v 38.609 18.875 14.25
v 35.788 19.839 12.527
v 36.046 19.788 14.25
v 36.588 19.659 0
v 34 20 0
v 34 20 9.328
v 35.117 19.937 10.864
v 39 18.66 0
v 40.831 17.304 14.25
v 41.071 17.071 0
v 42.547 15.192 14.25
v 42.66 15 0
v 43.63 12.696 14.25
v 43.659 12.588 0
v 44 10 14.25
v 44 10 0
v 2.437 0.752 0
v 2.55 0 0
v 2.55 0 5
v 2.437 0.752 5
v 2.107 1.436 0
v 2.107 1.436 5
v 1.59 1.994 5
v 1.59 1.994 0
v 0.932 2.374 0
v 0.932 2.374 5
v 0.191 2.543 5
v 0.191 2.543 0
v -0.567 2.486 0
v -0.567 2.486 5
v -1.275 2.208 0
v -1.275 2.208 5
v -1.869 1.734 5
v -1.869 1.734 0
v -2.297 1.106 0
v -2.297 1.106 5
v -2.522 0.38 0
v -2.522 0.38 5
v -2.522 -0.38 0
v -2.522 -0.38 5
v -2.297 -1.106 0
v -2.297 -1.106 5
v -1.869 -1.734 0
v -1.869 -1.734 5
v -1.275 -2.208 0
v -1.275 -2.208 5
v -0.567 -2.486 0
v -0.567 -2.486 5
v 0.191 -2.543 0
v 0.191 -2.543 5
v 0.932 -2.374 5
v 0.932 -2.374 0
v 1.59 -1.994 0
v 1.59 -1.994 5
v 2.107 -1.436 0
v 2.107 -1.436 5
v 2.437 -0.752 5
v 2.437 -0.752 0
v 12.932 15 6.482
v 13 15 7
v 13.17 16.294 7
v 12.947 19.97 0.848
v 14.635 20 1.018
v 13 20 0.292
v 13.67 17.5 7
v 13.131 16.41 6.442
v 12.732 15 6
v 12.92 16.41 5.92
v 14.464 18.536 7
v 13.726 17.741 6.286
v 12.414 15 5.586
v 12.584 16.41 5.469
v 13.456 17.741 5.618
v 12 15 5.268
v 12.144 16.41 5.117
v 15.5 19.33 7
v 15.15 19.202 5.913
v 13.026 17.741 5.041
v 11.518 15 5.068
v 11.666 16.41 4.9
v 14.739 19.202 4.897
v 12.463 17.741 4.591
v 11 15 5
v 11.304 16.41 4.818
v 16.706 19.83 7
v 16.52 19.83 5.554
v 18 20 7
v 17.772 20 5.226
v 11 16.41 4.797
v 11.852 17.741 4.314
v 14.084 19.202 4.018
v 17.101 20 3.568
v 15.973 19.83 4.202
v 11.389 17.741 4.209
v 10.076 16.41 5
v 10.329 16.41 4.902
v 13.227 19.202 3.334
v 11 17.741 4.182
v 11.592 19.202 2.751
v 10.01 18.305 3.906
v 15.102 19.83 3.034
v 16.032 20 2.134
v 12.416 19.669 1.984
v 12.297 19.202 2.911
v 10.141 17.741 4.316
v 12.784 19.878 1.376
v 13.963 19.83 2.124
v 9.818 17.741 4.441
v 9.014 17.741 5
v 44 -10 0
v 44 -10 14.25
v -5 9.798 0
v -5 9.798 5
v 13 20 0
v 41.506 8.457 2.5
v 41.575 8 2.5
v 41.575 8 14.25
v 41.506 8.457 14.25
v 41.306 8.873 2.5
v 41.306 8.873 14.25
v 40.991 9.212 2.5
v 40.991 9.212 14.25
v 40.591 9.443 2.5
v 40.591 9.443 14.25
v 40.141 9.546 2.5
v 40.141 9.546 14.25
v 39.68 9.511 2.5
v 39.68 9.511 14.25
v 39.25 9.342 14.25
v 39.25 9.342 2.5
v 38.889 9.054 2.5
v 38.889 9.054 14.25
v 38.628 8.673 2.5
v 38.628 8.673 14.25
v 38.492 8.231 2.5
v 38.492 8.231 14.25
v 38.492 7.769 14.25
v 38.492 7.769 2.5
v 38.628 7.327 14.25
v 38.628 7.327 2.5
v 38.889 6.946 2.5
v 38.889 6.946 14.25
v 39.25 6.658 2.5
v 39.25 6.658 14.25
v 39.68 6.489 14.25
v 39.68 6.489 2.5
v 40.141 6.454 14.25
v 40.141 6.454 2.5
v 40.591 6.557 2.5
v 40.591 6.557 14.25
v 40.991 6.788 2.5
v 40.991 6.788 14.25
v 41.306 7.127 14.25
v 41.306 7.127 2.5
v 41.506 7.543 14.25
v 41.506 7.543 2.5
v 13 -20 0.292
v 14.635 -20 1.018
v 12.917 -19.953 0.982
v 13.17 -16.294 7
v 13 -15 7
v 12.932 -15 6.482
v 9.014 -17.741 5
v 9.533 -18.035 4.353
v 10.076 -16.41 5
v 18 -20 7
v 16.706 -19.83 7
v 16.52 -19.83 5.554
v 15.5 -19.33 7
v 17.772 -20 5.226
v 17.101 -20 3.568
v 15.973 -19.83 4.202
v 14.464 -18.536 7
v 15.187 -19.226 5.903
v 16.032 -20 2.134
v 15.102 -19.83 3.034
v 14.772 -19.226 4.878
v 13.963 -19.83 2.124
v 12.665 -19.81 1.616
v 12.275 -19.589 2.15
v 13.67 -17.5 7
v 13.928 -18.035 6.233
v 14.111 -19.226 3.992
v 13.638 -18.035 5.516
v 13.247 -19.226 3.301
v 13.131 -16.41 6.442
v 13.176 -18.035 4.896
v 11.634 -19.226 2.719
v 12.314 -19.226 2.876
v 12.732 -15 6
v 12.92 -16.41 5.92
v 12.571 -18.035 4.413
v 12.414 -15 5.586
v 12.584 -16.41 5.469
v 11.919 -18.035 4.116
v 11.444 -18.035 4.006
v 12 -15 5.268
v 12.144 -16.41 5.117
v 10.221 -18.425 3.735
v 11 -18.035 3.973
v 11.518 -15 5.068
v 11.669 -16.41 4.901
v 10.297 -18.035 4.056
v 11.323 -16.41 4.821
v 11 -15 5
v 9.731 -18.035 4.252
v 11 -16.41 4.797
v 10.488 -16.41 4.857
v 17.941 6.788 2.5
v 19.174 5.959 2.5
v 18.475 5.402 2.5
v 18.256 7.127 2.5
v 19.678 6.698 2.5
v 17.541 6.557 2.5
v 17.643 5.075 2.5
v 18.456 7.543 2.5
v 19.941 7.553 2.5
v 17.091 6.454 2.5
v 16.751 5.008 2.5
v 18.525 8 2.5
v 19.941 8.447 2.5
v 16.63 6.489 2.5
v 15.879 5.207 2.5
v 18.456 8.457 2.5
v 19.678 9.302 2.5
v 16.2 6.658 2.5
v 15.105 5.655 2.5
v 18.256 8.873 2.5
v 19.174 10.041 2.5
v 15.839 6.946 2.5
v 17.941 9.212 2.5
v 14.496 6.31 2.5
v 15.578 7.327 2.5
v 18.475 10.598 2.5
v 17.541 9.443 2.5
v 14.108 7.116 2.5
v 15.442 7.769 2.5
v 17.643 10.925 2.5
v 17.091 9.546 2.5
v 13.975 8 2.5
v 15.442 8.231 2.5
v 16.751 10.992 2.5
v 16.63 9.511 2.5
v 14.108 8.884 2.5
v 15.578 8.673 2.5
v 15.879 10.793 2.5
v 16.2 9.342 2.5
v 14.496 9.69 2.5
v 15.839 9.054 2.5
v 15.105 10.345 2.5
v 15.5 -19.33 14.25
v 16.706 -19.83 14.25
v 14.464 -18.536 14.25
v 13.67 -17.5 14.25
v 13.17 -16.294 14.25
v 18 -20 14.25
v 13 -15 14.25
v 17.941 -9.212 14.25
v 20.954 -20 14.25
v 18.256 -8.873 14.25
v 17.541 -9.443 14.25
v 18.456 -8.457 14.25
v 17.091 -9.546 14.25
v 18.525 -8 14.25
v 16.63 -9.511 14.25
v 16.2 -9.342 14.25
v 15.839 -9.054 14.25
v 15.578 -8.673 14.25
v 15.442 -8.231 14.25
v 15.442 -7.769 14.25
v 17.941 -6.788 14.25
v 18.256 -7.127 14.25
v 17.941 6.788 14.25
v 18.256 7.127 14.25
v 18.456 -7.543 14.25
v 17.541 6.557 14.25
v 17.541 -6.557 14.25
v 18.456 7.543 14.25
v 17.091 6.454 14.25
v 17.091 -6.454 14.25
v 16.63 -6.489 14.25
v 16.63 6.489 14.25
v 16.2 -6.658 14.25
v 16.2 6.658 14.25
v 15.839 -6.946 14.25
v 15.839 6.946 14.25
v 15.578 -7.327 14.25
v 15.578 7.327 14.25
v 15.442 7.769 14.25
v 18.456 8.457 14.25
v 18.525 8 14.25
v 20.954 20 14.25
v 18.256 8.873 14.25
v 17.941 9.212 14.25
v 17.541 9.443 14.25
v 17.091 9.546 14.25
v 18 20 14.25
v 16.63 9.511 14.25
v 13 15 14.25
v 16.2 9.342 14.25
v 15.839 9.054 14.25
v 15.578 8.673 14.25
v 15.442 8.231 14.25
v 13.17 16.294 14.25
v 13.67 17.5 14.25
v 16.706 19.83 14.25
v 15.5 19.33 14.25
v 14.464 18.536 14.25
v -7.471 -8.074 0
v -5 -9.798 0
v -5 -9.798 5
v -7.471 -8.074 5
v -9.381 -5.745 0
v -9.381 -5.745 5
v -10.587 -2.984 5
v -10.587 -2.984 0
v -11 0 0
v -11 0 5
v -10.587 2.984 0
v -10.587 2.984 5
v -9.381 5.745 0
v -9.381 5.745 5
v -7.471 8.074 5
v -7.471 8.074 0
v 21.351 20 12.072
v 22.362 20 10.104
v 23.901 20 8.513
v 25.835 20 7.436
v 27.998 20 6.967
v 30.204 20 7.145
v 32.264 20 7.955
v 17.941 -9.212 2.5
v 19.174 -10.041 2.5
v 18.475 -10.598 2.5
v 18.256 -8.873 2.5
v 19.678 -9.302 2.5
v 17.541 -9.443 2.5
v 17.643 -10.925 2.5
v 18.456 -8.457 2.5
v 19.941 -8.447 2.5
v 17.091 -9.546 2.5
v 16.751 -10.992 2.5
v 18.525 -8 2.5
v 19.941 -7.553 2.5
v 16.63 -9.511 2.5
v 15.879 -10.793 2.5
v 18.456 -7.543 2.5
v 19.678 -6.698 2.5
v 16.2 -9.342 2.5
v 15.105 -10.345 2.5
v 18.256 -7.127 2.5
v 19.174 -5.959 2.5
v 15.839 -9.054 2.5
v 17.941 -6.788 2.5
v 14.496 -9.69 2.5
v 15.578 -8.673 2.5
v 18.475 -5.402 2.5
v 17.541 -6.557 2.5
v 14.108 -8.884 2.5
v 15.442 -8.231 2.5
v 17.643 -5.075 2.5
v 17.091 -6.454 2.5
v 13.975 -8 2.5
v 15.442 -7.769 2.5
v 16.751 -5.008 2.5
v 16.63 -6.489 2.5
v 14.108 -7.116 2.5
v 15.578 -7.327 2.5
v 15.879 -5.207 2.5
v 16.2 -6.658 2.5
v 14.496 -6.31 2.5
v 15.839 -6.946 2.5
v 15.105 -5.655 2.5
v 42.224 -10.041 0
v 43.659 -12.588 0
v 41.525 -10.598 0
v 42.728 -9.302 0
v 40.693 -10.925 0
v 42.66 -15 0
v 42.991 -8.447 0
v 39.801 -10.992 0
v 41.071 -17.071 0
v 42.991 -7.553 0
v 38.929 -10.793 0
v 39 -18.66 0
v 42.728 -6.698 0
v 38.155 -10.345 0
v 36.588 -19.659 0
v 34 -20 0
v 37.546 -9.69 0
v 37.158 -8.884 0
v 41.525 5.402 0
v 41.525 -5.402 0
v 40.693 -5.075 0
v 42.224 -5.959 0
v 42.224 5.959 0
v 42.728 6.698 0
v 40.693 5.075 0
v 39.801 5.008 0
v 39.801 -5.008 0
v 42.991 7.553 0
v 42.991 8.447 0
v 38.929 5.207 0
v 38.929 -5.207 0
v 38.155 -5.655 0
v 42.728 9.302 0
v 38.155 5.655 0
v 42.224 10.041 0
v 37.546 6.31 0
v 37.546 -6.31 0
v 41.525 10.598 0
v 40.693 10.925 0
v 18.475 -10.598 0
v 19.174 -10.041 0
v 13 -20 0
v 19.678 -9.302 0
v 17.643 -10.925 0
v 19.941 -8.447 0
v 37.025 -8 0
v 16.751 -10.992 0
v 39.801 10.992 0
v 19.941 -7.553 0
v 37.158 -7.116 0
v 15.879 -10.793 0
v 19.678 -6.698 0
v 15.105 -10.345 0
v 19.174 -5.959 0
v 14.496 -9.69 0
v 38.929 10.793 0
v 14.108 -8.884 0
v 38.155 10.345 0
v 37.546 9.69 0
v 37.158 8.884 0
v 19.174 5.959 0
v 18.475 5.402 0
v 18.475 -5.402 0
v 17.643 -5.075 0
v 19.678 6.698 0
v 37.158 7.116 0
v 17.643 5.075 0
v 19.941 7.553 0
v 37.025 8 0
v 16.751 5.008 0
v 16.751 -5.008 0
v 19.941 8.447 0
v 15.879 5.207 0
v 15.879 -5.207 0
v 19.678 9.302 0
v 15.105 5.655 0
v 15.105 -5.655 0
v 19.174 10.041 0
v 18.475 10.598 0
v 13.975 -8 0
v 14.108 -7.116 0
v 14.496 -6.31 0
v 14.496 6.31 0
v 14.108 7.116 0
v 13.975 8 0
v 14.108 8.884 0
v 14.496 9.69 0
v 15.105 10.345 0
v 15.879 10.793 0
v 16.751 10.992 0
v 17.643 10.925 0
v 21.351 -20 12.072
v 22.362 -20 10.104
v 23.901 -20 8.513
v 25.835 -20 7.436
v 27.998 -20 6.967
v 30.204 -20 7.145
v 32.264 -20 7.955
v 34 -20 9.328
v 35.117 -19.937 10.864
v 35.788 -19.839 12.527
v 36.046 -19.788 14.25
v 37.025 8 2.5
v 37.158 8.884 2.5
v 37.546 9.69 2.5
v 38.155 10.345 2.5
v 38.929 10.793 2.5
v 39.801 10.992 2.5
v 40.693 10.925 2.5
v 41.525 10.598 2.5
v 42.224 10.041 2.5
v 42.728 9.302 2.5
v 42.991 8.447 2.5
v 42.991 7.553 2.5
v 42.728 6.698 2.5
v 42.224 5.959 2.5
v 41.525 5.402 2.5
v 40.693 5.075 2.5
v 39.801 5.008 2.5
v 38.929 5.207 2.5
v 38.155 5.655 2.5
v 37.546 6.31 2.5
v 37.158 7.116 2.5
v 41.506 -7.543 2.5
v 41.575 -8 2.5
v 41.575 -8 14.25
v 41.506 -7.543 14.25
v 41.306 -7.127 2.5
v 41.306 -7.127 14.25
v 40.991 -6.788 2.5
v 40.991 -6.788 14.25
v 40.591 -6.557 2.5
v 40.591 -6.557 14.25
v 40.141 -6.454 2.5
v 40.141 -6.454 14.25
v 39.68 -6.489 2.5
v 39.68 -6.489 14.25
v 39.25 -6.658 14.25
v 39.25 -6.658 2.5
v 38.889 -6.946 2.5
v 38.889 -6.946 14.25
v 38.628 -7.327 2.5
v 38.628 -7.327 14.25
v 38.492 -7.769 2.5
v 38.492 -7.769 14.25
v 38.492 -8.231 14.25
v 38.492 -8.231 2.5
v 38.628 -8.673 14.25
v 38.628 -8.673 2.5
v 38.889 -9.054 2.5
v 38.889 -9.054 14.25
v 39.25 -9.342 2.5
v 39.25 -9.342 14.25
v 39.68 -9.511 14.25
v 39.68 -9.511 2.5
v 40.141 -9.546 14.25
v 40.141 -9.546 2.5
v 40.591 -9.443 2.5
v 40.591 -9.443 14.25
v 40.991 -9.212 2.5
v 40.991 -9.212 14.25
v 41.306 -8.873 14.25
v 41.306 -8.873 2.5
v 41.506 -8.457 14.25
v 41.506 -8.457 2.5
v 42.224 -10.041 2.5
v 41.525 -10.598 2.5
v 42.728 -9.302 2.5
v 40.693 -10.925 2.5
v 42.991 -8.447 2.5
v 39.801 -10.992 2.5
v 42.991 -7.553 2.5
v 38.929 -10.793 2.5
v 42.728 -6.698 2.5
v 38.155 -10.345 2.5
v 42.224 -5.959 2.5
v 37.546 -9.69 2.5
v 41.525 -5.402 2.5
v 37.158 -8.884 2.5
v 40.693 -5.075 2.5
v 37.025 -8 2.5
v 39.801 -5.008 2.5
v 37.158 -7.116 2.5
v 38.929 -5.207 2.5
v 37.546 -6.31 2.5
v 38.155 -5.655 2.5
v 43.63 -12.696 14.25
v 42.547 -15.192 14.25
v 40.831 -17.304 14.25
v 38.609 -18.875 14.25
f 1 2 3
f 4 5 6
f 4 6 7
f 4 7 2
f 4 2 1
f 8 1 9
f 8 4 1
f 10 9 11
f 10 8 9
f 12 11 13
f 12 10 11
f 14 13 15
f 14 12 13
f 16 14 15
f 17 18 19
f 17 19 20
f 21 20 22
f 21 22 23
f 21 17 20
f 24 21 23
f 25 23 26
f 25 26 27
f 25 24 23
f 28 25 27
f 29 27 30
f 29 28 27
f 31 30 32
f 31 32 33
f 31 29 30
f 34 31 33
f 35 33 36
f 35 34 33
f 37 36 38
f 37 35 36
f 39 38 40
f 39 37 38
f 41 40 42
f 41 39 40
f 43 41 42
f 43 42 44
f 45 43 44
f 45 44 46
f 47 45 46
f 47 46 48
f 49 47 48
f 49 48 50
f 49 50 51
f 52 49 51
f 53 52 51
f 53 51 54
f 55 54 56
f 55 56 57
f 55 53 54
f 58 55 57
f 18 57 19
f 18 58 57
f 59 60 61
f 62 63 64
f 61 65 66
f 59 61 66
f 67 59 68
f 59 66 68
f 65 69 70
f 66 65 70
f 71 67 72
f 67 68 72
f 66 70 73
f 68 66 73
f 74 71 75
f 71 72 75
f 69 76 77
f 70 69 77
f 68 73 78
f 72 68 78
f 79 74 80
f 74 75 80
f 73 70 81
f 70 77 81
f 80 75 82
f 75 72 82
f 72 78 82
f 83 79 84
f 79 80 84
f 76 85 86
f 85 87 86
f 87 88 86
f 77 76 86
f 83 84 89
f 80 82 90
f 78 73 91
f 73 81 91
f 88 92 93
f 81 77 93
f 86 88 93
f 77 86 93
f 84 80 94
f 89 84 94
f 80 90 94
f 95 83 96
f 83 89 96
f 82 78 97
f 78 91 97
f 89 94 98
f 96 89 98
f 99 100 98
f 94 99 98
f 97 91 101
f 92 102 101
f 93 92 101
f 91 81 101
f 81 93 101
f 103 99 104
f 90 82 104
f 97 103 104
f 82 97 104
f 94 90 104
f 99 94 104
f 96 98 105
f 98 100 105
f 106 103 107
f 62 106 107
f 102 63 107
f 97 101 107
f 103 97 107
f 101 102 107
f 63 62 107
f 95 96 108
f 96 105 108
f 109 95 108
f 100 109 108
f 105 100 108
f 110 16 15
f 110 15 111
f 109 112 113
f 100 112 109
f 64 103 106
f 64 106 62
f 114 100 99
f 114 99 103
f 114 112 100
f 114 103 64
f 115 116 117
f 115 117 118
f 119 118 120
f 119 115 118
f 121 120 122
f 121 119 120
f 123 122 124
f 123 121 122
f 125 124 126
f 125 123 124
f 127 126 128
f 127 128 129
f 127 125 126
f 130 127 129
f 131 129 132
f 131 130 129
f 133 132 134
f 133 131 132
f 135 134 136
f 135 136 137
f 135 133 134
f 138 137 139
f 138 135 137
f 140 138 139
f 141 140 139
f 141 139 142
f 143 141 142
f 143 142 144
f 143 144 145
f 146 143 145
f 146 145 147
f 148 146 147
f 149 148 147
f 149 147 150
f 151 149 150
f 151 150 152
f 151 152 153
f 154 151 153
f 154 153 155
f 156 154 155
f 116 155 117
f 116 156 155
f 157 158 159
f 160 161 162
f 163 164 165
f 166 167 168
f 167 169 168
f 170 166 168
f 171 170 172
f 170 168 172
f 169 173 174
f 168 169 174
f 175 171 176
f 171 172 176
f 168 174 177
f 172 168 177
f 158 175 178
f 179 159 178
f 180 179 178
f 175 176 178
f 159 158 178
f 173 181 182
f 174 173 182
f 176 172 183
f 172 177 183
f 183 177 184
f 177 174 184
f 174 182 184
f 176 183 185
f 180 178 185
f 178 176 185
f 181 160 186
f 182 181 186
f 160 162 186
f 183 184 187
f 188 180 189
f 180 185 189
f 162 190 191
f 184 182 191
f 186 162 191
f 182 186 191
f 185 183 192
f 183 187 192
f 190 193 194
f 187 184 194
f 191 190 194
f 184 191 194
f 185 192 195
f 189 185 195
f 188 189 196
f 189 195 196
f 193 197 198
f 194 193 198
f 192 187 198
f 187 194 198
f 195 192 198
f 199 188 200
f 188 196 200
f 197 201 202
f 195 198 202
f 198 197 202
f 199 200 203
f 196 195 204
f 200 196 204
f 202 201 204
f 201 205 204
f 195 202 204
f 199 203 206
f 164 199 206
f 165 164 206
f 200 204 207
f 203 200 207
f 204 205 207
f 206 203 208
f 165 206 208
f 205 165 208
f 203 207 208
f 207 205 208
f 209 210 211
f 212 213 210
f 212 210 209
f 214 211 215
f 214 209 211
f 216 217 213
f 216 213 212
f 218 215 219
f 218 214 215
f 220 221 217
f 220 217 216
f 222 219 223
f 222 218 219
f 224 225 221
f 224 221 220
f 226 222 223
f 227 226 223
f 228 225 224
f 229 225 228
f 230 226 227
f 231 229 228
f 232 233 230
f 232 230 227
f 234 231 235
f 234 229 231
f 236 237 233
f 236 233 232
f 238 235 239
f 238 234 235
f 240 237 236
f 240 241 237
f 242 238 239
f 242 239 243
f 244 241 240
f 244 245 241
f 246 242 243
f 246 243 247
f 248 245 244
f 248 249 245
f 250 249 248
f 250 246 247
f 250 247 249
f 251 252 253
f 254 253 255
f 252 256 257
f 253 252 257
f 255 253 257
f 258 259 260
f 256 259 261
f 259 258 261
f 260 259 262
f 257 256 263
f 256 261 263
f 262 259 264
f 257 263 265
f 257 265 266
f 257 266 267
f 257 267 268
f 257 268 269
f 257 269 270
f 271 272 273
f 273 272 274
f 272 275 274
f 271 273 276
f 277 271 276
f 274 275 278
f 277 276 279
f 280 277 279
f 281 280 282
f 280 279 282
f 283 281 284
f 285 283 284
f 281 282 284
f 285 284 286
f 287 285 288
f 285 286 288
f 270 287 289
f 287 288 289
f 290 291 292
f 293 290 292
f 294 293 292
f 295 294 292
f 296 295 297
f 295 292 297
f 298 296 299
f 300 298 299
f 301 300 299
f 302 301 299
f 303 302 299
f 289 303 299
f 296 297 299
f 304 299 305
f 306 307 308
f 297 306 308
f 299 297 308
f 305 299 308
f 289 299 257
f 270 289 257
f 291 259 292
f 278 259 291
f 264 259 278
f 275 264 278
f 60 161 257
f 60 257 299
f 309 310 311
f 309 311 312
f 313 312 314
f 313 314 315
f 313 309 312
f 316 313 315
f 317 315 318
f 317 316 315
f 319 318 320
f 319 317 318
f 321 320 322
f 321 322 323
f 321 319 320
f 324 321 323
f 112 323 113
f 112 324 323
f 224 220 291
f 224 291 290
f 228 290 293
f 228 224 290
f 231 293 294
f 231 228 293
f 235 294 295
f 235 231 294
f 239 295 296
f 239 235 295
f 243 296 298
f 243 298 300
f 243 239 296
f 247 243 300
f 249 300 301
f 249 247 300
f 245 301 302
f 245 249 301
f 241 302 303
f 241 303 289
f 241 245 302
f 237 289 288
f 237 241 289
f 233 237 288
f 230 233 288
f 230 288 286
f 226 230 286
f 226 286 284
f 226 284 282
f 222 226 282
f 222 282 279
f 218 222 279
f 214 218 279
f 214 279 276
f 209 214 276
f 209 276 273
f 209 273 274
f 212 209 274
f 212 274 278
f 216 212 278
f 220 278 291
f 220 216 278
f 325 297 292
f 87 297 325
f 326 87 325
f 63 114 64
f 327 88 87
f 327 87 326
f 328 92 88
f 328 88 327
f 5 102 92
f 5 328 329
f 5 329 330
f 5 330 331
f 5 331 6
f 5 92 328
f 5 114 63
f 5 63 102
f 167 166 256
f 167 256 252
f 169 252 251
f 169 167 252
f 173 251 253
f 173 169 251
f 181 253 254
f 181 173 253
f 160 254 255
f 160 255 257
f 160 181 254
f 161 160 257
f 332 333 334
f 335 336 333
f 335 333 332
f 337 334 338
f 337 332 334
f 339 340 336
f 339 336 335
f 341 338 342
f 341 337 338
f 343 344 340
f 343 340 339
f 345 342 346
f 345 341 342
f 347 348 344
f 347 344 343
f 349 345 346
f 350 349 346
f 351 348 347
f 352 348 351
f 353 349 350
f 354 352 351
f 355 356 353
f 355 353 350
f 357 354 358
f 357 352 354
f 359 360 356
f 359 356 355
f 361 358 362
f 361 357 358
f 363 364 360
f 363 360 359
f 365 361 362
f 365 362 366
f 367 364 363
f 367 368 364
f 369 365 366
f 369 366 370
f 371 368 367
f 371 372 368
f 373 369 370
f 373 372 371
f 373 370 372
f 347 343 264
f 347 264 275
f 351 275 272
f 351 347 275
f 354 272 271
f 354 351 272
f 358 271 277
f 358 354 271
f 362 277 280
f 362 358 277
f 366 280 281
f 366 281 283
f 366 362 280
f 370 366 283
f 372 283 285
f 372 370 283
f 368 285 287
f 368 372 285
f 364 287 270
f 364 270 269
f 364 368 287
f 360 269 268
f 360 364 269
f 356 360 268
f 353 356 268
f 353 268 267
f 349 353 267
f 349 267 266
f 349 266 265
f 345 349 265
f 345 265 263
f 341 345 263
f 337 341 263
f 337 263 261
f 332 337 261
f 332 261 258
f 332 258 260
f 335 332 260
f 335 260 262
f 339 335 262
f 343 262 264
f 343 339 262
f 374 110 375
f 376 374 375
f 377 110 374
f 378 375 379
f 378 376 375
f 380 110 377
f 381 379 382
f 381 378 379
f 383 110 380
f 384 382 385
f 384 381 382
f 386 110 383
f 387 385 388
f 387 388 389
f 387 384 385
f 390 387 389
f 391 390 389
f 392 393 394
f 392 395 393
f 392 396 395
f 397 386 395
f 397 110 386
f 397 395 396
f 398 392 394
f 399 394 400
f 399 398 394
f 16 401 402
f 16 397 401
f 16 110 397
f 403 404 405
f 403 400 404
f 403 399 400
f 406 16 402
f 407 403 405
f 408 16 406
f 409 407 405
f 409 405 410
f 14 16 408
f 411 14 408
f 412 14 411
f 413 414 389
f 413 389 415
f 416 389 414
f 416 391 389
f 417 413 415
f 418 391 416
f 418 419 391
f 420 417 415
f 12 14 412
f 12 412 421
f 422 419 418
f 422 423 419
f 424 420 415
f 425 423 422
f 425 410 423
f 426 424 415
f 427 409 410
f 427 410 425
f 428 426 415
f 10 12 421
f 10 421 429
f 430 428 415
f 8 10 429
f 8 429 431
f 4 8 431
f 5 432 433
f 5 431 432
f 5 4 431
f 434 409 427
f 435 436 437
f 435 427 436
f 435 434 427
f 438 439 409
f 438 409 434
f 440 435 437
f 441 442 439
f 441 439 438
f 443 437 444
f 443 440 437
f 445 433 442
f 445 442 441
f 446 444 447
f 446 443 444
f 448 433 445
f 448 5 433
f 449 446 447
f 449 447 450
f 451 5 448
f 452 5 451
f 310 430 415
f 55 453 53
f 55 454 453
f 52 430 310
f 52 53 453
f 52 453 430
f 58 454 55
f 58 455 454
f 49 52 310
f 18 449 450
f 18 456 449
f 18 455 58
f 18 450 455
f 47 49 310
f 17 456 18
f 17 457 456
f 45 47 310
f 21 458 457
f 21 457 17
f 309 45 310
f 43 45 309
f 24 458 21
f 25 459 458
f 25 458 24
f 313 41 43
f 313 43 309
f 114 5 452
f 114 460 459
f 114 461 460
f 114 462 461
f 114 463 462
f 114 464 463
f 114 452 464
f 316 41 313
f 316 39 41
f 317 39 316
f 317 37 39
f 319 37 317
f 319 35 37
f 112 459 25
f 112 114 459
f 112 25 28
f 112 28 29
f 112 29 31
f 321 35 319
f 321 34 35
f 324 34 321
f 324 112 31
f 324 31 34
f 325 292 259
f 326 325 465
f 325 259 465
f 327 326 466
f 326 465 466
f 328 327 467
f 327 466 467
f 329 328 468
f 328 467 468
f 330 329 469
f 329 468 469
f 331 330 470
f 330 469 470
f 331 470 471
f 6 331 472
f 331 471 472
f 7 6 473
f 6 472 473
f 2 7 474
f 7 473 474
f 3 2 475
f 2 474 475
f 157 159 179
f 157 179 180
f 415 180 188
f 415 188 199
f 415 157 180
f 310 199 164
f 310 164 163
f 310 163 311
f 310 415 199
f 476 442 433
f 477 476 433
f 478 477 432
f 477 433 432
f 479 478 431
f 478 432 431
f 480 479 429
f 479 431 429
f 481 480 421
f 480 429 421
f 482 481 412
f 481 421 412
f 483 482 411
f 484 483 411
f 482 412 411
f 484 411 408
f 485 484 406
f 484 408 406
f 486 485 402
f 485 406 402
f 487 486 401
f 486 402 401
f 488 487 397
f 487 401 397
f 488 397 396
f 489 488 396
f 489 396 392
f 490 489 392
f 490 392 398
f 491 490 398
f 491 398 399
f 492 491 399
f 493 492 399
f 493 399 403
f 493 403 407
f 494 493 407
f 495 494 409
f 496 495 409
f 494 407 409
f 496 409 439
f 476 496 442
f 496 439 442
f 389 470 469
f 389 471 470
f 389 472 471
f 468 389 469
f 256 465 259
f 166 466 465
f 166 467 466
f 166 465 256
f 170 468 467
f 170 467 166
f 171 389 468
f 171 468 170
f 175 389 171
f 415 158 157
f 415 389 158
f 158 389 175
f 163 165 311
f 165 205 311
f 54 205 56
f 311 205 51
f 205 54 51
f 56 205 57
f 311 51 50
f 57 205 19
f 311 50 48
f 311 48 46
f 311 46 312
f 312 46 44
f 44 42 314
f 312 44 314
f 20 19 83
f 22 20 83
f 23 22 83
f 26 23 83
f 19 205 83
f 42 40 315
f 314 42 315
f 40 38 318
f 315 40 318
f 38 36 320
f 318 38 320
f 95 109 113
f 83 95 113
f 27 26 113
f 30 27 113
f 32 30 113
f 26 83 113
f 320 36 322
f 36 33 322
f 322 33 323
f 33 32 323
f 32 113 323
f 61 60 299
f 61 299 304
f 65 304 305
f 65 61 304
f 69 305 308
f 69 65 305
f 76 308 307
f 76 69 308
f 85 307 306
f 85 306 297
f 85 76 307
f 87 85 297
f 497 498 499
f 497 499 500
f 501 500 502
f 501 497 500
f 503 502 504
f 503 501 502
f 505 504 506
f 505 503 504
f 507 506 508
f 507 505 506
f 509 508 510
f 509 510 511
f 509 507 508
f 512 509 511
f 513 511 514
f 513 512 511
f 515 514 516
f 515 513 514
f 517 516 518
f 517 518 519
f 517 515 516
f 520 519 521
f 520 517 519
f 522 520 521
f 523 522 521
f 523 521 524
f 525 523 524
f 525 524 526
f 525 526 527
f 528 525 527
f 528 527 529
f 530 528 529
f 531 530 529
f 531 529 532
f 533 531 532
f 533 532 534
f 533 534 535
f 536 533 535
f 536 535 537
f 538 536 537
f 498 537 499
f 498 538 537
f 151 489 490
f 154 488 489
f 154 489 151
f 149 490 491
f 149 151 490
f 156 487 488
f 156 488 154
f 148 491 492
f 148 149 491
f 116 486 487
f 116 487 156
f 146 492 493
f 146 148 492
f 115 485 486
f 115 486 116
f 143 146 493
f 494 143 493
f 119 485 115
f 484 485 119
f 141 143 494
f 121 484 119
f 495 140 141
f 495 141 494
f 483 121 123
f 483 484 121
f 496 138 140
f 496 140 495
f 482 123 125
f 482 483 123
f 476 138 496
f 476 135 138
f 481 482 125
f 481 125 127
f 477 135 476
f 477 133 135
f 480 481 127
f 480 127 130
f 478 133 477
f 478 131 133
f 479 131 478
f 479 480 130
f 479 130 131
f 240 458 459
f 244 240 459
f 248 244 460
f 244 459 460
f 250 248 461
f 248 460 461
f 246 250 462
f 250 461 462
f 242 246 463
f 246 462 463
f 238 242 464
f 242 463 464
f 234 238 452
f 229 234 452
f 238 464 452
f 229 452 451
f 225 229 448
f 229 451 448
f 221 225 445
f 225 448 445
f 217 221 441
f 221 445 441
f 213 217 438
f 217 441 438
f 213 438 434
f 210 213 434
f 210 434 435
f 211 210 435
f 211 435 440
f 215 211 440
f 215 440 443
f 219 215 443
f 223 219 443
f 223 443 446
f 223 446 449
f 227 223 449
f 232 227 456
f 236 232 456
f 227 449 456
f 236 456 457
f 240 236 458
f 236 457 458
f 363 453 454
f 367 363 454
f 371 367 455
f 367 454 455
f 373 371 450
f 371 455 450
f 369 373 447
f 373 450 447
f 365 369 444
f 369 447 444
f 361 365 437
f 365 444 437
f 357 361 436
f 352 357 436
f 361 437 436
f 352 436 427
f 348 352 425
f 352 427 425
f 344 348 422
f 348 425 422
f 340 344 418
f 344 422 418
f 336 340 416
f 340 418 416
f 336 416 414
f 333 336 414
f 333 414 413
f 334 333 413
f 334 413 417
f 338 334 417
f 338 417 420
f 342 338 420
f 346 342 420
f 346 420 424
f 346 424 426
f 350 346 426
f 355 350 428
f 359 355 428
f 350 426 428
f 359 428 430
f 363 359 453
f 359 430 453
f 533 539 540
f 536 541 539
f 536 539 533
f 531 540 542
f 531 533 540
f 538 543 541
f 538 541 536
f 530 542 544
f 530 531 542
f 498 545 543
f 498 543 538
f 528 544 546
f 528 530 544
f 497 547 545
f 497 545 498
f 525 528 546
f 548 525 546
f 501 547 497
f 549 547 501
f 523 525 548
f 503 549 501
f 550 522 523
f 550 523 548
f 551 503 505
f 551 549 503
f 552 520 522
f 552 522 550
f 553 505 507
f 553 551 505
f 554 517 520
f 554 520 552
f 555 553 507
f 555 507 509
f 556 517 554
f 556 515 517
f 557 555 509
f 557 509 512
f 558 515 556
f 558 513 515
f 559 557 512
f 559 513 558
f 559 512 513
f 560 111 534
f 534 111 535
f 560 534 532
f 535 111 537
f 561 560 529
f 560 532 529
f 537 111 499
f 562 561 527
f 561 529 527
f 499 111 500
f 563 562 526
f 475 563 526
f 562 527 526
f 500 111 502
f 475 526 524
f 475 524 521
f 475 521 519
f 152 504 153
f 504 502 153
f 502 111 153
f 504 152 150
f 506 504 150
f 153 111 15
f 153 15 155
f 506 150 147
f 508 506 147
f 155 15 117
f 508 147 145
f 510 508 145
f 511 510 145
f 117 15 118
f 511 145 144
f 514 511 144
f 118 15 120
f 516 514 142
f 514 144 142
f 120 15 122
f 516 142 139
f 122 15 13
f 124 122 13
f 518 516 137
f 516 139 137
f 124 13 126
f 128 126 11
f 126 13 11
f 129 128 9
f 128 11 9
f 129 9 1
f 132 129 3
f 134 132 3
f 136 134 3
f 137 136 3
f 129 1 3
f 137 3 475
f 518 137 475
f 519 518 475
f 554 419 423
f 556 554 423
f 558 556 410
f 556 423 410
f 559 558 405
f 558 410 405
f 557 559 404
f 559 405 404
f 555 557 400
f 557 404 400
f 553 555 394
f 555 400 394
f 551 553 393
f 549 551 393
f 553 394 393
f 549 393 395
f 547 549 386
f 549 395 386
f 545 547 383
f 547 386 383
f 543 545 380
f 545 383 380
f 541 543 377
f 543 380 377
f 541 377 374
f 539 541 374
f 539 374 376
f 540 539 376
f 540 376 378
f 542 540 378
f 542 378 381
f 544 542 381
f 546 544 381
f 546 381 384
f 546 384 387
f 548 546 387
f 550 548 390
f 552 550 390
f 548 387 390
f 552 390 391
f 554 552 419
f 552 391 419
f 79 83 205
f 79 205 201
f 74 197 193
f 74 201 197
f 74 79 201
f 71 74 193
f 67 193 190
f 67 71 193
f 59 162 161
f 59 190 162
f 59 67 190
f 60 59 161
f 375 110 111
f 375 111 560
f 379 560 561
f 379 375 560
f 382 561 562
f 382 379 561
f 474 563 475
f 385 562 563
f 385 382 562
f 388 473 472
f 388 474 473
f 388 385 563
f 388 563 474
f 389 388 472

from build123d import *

# Parameters (mm, degrees)
SKETCH_3_R          = 2.55
SKETCH_3_R_2        = 1.55
EXTRUDE_1_DEPTH     = 5
SKETCH_4_R          = 1.55
EXTRUDE_2_DEPTH     = 9.25
FILLET_1_R          = 2
FILLET_START        = 6.9999999
FILLET_2_2_DEPTH    = 8.0000001
SKETCH_5_R          = 3
CUT_EXTRUDE_1_DEPTH = 2.5
SKETCH_6_R          = 7.55
CUT_EXTRUDE_2_DEPTH = 62.147874109


with BuildPart() as part:
    # 草图3 → 凸台-拉伸1 (new body)
    with BuildSketch(Plane.XY):
        with BuildLine():
            Line((13, 20), (34, 20))
            ThreePointArc((34, 20), (41.071067812, 17.071067812), (44, 10))
            Line((44, 10), (44, -10))
            ThreePointArc((44, -10), (41.071067812, -17.071067812), (34, -20))
            Line((34, -20), (13, -20))
            Line((13, -20), (-5, -9.797958971))
            ThreePointArc((-5, -9.797958971), (-11, 0), (-5, 9.797958971))
            Line((-5, 9.797958971), (13, 20))
        make_face()
        Circle(SKETCH_3_R, mode=Mode.SUBTRACT)
        with Locations((40.025, 8)):
            Circle(SKETCH_3_R_2, mode=Mode.SUBTRACT)
        with Locations((40.025, -8)):
            Circle(SKETCH_3_R_2, mode=Mode.SUBTRACT)
        with Locations((16.975, -8)):
            Circle(SKETCH_3_R_2, mode=Mode.SUBTRACT)
        with Locations((16.975, 8)):
            Circle(SKETCH_3_R_2, mode=Mode.SUBTRACT)
    extrude(amount=EXTRUDE_1_DEPTH)

    # 草图4 → 凸台-拉伸2 (add)
    with BuildSketch(Plane.XY.offset(5)):
        with BuildLine():
            Line((13, 20), (34, 20))
            ThreePointArc((34, 20), (41.071067812, 17.071067812), (44, 10))
            Line((44, 10), (44, -10))
            ThreePointArc((44, -10), (41.071067812, -17.071067812), (34, -20))
            Line((34, -20), (13, -20))
            Line((13, -20), (13, 20))
        make_face()
        with Locations((16.975, -8)):
            Circle(SKETCH_4_R, mode=Mode.SUBTRACT)
        with Locations((16.975, 8)):
            Circle(SKETCH_4_R, mode=Mode.SUBTRACT)
        with Locations((40.025, 8)):
            Circle(SKETCH_4_R, mode=Mode.SUBTRACT)
        with Locations((40.025, -8)):
            Circle(SKETCH_4_R, mode=Mode.SUBTRACT)
    extrude(amount=EXTRUDE_2_DEPTH)

    # 圆角1
    fillet_1_edges = [part.edges().sort_by_distance(p)[0] for p in [
        (13, 0, 5),
    ]]
    fillet(fillet_1_edges, radius=FILLET_1_R)

    # 圆角2: read off the stored shape, not the designer's step
    # 圆角2 outline → 圆角2 (revolve, cut)
    with BuildSketch(Plane(origin=(11, 0, 7), x_dir=(1, 0, 0), z_dir=(0, 0, 1))):
        with BuildLine():
            ThreePointArc((7, -20), (3.464466094, -18.535533906), (2, -15))
            Line((2, -15), (2, -20))
            Line((2, -20), (7, -20))
        make_face()
        with BuildLine():
            Line((2, 20), (2, 15))
            ThreePointArc((2, 15), (3.464466094, 18.535533906), (7, 20))
            Line((7, 20), (2, 20))
        make_face()
    revolve(axis=Axis((11, 0, 7), (0, 1, 0)), mode=Mode.SUBTRACT)

    # Fillet 2 2 outline → Fillet 2 2 (cut)
    with BuildSketch(Plane.XY.offset(FILLET_START)):
        with BuildLine():
            Line((13, -20), (18, -20))
            ThreePointArc((18, -20), (14.464466094, -18.535533906), (13, -15))
            Line((13, -15), (13, -20))
        make_face()
        with BuildLine():
            Line((13, 20), (13, 15))
            ThreePointArc((13, 15), (14.464466094, 18.535533906), (18, 20))
            Line((18, 20), (13, 20))
        make_face()
    extrude(amount=FILLET_2_2_DEPTH, mode=Mode.SUBTRACT)

    # 草图5 → 切除-拉伸1 (cut)
    with BuildSketch(Plane(origin=(0, 0, 0), x_dir=(-1, 0, 0), z_dir=(0, 0, -1))):
        with Locations((-40.025, 8)):
            Circle(SKETCH_5_R)
        with Locations((-16.975, 8)):
            Circle(SKETCH_5_R)
        with Locations((-16.975, -8)):
            Circle(SKETCH_5_R)
        with Locations((-40.025, -8)):
            Circle(SKETCH_5_R)
    extrude(amount=-CUT_EXTRUDE_1_DEPTH, mode=Mode.SUBTRACT)

    # 草图6 → 切除-拉伸2 (cut, through all)
    with BuildSketch(Plane.XZ.offset(20)):
        with Locations((28.5, 14.5)):
            Circle(SKETCH_6_R)
    extrude(amount=-CUT_EXTRUDE_2_DEPTH, mode=Mode.SUBTRACT)


solid = part.part
